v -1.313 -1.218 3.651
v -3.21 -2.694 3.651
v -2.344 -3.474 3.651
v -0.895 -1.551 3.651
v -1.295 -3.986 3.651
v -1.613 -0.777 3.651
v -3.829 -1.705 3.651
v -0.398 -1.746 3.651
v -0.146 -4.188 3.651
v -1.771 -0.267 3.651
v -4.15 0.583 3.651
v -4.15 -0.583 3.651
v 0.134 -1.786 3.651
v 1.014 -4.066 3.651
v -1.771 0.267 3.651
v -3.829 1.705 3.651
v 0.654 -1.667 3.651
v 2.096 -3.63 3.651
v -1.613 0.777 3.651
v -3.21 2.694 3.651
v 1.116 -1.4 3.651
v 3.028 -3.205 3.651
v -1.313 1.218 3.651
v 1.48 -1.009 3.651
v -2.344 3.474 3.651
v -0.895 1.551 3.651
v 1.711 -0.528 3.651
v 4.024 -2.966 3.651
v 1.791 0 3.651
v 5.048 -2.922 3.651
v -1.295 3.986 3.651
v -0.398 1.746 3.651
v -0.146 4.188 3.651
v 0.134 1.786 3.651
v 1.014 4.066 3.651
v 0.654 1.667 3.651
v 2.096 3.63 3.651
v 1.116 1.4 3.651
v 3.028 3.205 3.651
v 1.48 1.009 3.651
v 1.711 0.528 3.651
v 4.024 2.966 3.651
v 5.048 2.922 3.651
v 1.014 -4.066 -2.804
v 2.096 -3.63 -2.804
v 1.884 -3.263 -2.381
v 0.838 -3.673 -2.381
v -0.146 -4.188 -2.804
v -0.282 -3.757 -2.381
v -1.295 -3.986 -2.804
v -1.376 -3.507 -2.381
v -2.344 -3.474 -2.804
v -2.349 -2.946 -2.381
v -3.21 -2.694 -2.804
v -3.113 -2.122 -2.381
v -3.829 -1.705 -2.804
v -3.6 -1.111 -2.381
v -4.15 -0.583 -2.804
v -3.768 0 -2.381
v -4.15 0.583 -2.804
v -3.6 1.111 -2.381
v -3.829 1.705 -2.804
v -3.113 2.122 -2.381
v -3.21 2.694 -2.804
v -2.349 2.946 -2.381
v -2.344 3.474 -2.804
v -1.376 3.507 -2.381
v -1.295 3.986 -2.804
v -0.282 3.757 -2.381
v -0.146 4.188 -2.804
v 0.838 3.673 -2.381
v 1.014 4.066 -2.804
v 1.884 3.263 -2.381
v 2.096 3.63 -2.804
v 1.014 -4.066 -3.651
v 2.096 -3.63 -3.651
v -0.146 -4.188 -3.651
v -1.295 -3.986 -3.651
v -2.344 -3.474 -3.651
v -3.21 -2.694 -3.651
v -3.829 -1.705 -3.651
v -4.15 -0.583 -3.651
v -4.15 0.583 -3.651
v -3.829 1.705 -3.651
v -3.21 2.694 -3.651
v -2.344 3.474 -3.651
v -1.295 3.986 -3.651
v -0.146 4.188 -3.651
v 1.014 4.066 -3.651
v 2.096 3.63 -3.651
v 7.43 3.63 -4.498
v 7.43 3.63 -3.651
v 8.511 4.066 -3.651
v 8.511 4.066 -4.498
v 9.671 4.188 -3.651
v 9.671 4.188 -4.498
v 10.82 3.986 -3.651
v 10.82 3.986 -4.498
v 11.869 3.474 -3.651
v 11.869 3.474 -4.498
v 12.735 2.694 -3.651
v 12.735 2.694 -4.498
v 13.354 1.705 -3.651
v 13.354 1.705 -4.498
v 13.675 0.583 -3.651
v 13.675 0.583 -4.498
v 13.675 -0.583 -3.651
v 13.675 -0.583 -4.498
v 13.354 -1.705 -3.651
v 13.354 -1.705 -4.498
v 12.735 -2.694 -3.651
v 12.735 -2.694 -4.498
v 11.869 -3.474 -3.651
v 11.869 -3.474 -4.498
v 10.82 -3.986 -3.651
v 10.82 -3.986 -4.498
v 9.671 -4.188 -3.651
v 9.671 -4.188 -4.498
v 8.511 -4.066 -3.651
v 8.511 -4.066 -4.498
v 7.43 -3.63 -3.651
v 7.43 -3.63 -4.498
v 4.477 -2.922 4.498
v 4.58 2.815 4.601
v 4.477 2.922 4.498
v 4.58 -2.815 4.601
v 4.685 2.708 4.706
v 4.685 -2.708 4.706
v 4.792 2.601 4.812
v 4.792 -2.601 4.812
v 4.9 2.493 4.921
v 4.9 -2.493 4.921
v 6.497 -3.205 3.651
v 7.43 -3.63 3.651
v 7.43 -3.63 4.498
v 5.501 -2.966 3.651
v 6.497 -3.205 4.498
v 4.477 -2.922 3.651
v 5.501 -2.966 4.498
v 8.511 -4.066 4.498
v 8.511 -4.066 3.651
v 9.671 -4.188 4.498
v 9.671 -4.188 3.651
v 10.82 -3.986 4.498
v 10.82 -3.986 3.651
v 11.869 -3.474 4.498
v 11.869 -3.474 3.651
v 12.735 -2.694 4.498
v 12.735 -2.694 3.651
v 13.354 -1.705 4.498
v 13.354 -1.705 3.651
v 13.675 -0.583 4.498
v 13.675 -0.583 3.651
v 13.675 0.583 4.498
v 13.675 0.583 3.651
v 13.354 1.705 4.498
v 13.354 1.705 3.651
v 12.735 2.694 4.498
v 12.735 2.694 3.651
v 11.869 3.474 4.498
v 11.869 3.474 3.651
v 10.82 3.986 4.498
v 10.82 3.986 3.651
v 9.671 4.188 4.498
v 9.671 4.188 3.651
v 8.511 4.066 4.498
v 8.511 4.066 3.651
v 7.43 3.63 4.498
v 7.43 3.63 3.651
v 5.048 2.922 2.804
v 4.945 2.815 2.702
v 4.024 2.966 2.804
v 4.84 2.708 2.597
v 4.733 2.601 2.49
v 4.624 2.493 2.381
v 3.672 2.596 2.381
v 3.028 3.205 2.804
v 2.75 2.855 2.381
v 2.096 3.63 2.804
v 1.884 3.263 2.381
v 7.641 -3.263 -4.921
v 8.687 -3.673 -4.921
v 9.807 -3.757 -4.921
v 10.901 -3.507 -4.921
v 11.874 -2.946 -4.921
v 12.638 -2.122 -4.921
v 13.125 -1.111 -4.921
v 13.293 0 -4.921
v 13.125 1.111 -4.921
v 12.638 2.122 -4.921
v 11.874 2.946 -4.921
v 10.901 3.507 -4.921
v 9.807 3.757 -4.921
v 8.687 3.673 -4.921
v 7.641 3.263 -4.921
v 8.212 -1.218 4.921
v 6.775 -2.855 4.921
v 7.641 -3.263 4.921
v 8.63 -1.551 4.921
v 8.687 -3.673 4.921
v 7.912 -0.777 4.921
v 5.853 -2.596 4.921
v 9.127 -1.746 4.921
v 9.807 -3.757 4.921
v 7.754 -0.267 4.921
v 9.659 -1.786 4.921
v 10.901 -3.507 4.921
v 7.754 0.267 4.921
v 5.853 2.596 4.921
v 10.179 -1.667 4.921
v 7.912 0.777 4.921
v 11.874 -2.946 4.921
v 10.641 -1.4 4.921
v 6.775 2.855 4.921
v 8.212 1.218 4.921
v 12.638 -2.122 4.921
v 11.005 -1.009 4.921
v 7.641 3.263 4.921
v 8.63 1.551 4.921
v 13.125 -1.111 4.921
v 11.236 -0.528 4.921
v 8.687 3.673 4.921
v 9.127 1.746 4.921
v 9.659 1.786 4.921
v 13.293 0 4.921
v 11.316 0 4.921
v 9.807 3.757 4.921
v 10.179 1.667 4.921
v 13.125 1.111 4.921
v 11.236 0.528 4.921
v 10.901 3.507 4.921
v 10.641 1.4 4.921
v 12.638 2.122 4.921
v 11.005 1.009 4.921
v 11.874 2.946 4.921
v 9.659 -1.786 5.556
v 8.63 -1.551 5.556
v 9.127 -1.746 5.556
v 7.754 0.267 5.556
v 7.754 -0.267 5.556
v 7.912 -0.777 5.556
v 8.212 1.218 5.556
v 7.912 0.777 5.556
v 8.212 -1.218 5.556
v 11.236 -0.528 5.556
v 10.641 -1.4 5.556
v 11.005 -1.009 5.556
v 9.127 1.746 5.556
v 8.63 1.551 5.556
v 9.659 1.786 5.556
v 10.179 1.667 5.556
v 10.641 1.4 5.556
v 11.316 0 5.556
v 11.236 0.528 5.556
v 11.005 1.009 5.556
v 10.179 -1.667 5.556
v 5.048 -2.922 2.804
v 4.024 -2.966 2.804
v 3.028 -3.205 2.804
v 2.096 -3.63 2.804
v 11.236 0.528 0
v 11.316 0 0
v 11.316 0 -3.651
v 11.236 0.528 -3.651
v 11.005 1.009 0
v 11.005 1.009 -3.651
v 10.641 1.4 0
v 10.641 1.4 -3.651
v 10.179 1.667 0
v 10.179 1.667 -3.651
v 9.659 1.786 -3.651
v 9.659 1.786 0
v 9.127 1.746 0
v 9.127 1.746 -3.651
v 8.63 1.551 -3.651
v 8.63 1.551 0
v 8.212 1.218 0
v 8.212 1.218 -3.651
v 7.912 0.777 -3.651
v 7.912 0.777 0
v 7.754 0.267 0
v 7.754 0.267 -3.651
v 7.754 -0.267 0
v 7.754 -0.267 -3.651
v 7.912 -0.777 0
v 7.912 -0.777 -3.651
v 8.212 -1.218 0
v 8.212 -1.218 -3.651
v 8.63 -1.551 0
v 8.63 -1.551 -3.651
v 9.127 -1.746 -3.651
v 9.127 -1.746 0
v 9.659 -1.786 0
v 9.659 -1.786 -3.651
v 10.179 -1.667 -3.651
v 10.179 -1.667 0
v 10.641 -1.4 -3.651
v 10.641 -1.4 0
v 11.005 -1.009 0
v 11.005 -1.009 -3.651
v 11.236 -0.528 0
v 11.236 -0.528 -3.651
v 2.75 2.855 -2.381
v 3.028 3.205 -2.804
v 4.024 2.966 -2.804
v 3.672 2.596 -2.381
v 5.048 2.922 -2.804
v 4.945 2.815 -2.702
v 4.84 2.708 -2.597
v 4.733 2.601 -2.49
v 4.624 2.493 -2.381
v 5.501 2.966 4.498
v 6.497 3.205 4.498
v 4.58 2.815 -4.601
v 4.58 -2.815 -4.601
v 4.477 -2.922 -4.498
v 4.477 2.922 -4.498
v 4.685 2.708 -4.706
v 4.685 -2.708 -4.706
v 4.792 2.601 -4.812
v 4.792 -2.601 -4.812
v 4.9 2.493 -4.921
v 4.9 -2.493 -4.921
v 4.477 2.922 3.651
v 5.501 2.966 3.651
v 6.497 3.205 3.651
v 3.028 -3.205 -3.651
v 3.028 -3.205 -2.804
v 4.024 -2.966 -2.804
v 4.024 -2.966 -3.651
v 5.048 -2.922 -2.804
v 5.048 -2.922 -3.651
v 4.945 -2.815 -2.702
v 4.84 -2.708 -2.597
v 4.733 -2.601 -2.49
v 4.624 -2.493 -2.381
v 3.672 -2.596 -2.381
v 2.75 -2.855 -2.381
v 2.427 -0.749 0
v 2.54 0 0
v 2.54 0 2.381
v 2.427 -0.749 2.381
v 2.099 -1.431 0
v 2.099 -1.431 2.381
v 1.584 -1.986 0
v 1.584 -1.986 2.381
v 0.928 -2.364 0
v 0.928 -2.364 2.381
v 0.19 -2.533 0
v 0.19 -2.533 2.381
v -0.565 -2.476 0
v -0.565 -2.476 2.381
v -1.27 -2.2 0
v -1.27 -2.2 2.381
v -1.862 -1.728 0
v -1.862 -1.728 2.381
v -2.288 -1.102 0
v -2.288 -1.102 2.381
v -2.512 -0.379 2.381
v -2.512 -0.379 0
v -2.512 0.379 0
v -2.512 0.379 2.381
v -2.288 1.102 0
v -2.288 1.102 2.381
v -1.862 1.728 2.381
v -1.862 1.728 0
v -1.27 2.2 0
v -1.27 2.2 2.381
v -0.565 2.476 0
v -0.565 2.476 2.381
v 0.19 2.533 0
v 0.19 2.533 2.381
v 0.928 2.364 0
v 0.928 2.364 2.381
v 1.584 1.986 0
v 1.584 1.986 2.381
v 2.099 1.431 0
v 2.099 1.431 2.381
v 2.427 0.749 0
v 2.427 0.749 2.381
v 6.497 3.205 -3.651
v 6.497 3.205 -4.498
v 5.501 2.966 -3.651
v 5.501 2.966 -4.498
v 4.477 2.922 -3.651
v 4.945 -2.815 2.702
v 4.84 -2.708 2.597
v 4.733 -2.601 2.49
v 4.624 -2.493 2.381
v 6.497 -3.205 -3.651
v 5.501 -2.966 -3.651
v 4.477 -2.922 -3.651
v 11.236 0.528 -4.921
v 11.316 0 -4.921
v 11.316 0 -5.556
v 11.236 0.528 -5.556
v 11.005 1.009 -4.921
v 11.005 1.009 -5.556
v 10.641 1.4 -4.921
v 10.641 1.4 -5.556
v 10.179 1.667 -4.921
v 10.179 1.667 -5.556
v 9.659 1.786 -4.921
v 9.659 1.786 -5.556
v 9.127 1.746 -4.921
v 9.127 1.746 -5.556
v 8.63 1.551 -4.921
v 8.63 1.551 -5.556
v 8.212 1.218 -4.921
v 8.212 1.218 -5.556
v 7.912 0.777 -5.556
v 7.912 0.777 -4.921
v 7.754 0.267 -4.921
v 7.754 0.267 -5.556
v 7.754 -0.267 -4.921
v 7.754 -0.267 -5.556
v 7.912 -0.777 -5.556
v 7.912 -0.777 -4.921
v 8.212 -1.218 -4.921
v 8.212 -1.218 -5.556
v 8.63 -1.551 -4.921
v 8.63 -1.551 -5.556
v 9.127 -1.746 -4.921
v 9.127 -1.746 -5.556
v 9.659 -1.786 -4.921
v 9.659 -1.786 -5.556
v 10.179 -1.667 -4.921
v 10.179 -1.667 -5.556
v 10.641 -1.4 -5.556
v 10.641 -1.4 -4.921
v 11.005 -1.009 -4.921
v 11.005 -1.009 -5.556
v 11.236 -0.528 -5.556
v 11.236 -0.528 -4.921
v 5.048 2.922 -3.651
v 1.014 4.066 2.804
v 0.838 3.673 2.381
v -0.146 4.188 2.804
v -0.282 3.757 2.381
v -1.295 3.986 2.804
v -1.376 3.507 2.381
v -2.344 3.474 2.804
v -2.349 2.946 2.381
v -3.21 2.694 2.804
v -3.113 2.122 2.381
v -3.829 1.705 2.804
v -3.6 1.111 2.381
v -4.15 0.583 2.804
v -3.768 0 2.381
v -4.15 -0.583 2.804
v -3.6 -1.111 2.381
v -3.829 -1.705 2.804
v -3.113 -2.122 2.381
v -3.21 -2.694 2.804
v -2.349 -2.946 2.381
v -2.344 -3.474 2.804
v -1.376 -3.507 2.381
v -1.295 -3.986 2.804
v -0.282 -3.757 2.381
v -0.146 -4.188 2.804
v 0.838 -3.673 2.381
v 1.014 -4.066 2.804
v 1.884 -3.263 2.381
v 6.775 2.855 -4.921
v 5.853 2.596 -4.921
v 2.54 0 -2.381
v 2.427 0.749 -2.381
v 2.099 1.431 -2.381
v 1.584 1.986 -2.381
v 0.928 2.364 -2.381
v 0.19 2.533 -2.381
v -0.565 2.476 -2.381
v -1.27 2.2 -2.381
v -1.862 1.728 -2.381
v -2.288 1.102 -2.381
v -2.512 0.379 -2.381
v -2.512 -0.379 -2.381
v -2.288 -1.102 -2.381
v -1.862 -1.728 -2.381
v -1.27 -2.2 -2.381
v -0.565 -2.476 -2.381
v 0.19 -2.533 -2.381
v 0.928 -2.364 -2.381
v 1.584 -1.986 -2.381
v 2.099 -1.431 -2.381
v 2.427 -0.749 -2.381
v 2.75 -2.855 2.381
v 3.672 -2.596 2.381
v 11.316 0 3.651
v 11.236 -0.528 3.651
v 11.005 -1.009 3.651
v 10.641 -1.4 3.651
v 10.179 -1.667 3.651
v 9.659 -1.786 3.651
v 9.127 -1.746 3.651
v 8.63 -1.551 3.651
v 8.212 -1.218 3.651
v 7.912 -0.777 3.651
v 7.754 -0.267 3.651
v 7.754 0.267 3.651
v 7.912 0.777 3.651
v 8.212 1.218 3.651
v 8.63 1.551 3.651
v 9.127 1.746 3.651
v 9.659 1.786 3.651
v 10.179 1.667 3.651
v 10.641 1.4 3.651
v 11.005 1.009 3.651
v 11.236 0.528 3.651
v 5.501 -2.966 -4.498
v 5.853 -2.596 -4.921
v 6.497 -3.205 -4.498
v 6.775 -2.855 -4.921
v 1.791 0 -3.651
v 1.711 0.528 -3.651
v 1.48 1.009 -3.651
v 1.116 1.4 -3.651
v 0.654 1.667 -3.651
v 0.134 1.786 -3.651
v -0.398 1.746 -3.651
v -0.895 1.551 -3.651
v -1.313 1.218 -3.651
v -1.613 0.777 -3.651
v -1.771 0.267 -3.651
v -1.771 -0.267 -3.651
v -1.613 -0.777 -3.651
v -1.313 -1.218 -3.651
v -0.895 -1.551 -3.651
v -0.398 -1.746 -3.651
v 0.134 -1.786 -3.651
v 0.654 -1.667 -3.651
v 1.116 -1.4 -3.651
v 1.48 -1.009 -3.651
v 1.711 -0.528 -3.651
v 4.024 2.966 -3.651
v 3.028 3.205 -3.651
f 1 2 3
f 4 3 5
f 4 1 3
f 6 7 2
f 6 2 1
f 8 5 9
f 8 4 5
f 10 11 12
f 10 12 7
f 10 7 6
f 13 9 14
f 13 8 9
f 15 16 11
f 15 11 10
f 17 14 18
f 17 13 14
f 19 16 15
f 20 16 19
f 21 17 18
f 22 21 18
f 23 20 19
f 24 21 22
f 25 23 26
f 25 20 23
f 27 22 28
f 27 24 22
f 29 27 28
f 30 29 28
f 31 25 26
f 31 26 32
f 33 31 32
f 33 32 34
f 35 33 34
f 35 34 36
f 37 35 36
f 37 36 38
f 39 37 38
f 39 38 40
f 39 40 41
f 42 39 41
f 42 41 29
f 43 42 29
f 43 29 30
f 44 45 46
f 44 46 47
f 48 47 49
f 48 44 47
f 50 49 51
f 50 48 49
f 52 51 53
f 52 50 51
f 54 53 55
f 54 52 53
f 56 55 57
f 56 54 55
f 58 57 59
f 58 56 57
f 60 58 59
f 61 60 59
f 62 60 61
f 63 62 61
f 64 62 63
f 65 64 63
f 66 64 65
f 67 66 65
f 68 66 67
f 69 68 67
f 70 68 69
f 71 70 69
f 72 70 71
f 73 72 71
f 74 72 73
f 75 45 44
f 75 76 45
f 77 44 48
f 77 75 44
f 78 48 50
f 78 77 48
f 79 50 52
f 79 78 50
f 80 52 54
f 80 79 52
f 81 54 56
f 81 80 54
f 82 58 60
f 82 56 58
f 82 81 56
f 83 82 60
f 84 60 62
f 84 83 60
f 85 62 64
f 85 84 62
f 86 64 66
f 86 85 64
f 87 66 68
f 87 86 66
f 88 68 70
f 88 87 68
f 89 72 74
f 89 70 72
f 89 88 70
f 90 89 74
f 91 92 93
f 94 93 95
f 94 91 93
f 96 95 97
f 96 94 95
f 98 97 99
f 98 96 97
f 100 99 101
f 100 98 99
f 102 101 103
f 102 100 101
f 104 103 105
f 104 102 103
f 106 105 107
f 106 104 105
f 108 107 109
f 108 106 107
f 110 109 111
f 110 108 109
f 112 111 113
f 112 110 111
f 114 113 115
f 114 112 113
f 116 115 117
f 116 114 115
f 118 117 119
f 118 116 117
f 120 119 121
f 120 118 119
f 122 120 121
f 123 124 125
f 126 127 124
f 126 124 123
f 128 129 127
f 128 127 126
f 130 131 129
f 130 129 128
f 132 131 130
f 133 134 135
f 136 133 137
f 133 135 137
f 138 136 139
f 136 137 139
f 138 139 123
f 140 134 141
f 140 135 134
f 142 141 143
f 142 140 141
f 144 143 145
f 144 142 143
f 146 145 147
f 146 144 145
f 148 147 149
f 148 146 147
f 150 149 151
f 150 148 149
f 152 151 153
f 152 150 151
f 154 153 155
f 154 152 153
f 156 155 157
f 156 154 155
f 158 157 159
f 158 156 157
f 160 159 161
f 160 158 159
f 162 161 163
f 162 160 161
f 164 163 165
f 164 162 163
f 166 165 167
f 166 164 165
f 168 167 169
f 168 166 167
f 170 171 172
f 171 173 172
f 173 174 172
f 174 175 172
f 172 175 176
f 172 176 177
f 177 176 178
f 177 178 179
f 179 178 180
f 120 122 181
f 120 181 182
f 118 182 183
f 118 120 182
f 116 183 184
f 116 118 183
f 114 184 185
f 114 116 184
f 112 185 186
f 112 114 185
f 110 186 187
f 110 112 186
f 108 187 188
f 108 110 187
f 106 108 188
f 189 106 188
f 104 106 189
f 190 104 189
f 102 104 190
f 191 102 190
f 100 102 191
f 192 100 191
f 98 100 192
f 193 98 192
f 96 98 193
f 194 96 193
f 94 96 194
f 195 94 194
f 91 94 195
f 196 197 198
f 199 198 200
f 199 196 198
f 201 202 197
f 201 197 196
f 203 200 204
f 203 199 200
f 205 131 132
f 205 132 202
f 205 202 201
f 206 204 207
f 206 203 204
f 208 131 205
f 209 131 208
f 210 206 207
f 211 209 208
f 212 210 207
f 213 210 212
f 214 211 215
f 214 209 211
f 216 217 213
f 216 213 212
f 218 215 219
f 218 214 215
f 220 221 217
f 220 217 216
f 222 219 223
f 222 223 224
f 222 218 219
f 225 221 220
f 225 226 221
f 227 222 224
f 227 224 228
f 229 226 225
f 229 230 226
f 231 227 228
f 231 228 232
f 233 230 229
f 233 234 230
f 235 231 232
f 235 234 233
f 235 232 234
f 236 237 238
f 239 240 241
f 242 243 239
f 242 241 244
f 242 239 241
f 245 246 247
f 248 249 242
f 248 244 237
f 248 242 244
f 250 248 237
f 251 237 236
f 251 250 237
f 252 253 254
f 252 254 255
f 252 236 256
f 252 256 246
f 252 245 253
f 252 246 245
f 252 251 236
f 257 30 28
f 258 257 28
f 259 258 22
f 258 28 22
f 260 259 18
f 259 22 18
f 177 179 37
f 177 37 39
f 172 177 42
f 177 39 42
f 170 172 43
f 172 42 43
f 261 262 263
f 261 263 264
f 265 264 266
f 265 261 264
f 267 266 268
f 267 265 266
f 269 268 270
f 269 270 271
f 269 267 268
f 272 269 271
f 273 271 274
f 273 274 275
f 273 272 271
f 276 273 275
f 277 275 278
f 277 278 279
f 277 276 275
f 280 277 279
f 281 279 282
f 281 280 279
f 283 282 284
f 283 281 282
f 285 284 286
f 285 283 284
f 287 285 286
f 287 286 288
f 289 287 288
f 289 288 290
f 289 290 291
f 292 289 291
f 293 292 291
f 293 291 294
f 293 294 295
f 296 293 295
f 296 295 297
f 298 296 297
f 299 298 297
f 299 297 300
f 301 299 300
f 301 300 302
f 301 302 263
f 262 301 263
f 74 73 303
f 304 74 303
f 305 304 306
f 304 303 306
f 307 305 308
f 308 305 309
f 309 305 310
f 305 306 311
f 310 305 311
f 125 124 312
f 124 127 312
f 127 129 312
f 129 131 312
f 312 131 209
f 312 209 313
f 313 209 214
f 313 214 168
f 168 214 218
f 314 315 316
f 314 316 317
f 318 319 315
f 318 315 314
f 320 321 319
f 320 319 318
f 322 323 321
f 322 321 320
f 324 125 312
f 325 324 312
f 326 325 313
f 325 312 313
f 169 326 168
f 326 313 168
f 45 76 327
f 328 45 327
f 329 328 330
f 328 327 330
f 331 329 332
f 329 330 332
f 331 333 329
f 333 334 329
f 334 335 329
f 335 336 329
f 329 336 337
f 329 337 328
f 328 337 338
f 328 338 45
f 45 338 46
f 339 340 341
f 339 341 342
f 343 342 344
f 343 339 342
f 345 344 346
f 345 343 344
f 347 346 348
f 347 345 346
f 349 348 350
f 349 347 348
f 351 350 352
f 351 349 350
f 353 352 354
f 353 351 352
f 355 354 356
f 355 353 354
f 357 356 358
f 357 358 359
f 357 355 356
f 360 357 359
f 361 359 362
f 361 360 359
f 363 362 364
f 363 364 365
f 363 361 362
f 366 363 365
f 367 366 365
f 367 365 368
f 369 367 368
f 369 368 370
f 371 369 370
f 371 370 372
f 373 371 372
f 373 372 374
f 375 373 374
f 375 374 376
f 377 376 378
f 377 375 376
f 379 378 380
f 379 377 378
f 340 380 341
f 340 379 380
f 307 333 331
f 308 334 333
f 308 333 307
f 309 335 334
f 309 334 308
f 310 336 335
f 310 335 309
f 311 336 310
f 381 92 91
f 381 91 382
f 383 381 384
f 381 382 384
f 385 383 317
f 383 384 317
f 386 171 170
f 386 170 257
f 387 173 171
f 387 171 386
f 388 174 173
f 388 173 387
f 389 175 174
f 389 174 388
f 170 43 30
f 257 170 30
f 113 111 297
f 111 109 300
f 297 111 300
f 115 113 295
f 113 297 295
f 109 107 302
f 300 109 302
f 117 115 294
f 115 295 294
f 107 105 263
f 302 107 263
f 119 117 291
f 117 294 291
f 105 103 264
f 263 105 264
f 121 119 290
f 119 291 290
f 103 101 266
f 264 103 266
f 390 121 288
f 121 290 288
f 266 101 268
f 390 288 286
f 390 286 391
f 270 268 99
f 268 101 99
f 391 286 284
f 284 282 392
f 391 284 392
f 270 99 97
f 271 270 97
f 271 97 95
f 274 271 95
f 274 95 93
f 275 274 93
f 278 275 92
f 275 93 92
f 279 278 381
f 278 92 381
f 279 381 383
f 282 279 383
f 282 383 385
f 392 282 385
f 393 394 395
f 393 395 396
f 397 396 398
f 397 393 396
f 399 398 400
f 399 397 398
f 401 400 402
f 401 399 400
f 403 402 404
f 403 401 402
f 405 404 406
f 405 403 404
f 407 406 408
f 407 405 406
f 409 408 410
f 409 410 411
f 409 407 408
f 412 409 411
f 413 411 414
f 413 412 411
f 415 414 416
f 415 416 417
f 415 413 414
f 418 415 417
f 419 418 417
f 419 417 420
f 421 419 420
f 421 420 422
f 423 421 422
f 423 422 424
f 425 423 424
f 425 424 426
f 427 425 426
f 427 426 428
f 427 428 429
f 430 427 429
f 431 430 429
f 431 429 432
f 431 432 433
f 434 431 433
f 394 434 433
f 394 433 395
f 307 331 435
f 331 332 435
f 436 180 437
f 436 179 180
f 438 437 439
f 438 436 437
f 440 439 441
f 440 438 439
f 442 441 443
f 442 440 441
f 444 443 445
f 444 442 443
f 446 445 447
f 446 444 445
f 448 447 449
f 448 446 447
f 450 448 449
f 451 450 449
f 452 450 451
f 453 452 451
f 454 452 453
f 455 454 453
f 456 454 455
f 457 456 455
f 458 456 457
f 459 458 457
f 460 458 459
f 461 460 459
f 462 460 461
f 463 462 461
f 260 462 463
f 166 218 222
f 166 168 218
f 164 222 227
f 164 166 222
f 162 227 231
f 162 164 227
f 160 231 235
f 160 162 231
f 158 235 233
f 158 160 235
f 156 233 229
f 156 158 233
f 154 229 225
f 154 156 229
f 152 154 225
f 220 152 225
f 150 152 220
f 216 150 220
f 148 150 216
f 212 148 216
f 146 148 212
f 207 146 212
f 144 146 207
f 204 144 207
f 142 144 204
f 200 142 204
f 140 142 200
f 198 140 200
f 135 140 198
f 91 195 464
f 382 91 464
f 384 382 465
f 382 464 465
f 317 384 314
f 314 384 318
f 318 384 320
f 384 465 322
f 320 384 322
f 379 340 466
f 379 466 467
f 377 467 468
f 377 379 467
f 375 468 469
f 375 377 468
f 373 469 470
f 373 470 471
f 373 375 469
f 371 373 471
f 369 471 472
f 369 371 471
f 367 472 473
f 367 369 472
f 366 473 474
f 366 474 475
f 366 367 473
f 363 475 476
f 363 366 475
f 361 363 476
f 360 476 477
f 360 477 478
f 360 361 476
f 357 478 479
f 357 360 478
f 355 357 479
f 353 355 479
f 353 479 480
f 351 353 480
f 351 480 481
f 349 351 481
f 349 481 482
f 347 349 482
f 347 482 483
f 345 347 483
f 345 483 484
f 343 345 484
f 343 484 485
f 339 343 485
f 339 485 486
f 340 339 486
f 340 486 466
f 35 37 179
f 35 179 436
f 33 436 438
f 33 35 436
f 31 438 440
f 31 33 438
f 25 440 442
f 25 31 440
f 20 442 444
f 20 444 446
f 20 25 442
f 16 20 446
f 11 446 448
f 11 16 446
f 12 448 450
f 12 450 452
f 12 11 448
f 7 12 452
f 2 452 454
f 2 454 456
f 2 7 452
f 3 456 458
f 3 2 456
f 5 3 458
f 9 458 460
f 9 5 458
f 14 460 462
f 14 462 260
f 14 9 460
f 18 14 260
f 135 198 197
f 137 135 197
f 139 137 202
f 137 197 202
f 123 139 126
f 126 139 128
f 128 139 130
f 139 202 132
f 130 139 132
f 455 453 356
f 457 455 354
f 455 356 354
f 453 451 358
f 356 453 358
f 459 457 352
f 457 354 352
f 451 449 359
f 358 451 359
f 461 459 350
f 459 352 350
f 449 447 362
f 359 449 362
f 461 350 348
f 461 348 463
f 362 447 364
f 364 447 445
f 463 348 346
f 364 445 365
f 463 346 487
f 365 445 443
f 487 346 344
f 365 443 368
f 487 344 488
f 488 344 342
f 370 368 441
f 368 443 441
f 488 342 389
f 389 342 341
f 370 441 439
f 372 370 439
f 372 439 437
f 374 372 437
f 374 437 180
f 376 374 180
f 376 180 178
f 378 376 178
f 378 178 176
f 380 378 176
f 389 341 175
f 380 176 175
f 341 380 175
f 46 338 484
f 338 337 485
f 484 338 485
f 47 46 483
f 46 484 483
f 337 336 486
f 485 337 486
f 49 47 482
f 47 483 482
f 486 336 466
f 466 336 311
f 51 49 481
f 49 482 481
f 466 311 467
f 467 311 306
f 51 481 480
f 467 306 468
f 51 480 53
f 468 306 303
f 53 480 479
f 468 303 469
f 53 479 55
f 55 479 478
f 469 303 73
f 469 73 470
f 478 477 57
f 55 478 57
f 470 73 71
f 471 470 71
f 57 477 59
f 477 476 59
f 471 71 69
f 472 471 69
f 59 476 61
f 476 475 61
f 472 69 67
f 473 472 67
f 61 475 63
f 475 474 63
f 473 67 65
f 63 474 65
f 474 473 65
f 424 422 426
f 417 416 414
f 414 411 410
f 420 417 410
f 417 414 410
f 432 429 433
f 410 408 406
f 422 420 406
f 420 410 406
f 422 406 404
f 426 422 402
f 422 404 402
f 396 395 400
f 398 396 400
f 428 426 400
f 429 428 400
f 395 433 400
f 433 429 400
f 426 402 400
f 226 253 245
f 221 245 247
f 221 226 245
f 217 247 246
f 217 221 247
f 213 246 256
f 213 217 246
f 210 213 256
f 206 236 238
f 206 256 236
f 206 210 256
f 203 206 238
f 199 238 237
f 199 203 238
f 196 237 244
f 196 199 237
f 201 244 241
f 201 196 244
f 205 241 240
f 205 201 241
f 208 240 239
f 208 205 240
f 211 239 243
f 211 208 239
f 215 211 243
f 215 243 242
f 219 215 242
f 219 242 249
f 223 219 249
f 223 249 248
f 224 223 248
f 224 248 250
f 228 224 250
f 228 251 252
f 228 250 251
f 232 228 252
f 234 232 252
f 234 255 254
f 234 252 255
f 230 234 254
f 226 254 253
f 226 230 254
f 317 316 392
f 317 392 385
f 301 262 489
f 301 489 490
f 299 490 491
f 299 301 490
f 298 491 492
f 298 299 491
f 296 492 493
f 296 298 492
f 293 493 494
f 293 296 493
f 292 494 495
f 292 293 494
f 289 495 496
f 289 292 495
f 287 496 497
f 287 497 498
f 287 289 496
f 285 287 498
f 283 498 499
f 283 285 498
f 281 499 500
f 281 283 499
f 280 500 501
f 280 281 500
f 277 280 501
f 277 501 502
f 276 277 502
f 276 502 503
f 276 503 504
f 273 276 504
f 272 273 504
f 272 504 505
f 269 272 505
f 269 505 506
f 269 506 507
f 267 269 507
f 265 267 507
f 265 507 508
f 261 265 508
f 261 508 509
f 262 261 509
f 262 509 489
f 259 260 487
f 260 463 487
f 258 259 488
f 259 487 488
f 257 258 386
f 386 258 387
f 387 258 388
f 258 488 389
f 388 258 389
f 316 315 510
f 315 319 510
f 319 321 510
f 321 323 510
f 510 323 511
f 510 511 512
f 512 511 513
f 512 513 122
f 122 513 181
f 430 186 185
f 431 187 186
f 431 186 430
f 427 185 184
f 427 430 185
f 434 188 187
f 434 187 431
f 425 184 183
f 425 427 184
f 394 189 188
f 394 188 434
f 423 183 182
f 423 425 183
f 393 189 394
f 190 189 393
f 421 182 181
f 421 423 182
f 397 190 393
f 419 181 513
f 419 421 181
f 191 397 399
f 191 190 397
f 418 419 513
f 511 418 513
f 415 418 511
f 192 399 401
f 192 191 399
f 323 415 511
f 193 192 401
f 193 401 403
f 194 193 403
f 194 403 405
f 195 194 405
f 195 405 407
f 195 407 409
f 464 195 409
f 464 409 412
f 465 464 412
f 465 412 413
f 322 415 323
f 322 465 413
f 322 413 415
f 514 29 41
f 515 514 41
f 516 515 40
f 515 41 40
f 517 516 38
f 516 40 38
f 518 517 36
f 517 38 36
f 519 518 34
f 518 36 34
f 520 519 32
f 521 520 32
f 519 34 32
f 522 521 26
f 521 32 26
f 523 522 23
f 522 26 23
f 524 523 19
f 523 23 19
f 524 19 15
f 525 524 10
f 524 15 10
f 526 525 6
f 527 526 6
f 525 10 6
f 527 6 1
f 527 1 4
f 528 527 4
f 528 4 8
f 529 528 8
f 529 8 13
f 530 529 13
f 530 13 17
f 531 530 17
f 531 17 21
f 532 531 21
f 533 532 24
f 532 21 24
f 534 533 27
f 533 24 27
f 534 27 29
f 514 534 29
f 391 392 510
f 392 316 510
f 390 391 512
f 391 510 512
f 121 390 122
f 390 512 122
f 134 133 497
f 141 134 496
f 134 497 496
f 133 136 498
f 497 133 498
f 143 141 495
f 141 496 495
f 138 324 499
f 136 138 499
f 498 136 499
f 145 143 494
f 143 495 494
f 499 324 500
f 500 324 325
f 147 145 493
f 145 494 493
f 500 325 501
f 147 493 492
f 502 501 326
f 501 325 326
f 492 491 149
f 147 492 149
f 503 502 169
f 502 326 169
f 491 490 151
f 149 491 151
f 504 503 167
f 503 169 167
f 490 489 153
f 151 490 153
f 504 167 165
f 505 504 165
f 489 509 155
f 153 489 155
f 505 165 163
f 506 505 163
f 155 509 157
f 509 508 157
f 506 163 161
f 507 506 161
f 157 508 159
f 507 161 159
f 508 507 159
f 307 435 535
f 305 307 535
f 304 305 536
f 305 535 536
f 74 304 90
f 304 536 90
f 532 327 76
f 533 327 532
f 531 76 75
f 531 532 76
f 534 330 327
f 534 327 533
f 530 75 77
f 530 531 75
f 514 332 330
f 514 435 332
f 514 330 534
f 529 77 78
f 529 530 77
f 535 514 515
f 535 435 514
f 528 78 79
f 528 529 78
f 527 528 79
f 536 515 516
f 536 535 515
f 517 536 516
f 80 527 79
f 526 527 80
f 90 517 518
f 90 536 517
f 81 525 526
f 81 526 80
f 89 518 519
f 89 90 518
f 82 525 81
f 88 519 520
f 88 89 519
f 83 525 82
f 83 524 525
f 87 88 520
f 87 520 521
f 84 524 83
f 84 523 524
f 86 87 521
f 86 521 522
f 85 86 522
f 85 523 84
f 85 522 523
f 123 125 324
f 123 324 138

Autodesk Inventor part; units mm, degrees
ref_plane "YZ Plane" through (0, 0, 0) normal (1, 0, 0) x (0, 1, 0)
ref_plane "Work Plane1" through (0, 0, 3.6512) normal (0, 0, 1) x (1, 0, 0)
sketch "Sketch1" plane through (0, 0, 3.6512) normal (0, 0, 1) x (1, 0, 0)
  arc A0 (2.0955, 3.6295) -> (2.0955, -3.6295) centre (0, 0) ccw
  arc A1 (2.0955, 3.6295) -> (5.0478, 2.9225) centre (4.7625, 8.2489) ccw
  line L0 (5.0478, 2.9225) -> (5.0478, -2.9225)
  arc A2 (5.0478, -2.9225) -> (2.0955, -3.6295) centre (4.7625, -8.2489) ccw
extrude "Extrusion1" add sketch "Sketch1" against normal blind 1.27
chamfer "Chamfer1" distance 0.4233 angle 45 4 edges at (-4.191, 0, 2.3812) (3.5203, 3.0615, 2.3812) (5.0478, 0, 2.3812) (3.5203, -3.0615, 2.3812)
sketch "Sketch2" plane through (0, 0, 0) normal (0, 0, 1) x (1, 0, 0)
  circle A0 centre (0, 0) radius 2.54
extrude "Extrusion2" add sketch "Sketch2" along normal mid plane 6.0325
mirror "Mirror1" about plane through (0, 0, 0) normal (0, 0, 1) of "Extrusion1", "Chamfer1"
sketch "Sketch3" plane through (0, 0, 0) normal (0, 0, 1) x (1, 0, 0)
  circle A0 centre (0, 0) radius 1.7907
extrude "Extrusion3" cut sketch "Sketch3" along normal through all both and the other way through all
ref_plane "Work Plane2" through (0, 0, 4.9213) normal (0, 0, 1) x (1, 0, 0)
sketch "Sketch4" plane through (0, 0, 4.9213) normal (0, 0, 1) x (1, 0, 0)
  arc A0 (4.4772, 2.9225) -> (7.4295, 3.6295) centre (4.7625, 8.2489) ccw
  arc A1 (7.4295, -3.6295) -> (7.4295, 3.6295) centre (9.525, 0) ccw
  arc A2 (7.4295, -3.6295) -> (4.4772, -2.9225) centre (4.7625, -8.2489) ccw
  line L0 (4.4772, 2.9225) -> (4.4772, -2.9225)
extrude "Extrusion4" add sketch "Sketch4" against normal blind 1.27
chamfer "Chamfer2" distance 0.4233 angle 45 4 edges at (6.0047, 3.0615, 4.9213) (4.4772, 0, 4.9213) (6.0047, -3.0615, 4.9213) (13.716, 0, 4.9213)
mirror "Mirror2" about plane through (0, 0, 0) normal (0, 0, 1) of "Extrusion4", "Chamfer2"
sketch "Sketch5" plane through (0, 0, 0) normal (0, 0, 1) x (1, 0, 0)
  circle A0 centre (9.525, 0) radius 1.7907
extrude "Extrusion5" add sketch "Sketch5" along normal mid plane 11.1125
properties part number "HalfLink"
